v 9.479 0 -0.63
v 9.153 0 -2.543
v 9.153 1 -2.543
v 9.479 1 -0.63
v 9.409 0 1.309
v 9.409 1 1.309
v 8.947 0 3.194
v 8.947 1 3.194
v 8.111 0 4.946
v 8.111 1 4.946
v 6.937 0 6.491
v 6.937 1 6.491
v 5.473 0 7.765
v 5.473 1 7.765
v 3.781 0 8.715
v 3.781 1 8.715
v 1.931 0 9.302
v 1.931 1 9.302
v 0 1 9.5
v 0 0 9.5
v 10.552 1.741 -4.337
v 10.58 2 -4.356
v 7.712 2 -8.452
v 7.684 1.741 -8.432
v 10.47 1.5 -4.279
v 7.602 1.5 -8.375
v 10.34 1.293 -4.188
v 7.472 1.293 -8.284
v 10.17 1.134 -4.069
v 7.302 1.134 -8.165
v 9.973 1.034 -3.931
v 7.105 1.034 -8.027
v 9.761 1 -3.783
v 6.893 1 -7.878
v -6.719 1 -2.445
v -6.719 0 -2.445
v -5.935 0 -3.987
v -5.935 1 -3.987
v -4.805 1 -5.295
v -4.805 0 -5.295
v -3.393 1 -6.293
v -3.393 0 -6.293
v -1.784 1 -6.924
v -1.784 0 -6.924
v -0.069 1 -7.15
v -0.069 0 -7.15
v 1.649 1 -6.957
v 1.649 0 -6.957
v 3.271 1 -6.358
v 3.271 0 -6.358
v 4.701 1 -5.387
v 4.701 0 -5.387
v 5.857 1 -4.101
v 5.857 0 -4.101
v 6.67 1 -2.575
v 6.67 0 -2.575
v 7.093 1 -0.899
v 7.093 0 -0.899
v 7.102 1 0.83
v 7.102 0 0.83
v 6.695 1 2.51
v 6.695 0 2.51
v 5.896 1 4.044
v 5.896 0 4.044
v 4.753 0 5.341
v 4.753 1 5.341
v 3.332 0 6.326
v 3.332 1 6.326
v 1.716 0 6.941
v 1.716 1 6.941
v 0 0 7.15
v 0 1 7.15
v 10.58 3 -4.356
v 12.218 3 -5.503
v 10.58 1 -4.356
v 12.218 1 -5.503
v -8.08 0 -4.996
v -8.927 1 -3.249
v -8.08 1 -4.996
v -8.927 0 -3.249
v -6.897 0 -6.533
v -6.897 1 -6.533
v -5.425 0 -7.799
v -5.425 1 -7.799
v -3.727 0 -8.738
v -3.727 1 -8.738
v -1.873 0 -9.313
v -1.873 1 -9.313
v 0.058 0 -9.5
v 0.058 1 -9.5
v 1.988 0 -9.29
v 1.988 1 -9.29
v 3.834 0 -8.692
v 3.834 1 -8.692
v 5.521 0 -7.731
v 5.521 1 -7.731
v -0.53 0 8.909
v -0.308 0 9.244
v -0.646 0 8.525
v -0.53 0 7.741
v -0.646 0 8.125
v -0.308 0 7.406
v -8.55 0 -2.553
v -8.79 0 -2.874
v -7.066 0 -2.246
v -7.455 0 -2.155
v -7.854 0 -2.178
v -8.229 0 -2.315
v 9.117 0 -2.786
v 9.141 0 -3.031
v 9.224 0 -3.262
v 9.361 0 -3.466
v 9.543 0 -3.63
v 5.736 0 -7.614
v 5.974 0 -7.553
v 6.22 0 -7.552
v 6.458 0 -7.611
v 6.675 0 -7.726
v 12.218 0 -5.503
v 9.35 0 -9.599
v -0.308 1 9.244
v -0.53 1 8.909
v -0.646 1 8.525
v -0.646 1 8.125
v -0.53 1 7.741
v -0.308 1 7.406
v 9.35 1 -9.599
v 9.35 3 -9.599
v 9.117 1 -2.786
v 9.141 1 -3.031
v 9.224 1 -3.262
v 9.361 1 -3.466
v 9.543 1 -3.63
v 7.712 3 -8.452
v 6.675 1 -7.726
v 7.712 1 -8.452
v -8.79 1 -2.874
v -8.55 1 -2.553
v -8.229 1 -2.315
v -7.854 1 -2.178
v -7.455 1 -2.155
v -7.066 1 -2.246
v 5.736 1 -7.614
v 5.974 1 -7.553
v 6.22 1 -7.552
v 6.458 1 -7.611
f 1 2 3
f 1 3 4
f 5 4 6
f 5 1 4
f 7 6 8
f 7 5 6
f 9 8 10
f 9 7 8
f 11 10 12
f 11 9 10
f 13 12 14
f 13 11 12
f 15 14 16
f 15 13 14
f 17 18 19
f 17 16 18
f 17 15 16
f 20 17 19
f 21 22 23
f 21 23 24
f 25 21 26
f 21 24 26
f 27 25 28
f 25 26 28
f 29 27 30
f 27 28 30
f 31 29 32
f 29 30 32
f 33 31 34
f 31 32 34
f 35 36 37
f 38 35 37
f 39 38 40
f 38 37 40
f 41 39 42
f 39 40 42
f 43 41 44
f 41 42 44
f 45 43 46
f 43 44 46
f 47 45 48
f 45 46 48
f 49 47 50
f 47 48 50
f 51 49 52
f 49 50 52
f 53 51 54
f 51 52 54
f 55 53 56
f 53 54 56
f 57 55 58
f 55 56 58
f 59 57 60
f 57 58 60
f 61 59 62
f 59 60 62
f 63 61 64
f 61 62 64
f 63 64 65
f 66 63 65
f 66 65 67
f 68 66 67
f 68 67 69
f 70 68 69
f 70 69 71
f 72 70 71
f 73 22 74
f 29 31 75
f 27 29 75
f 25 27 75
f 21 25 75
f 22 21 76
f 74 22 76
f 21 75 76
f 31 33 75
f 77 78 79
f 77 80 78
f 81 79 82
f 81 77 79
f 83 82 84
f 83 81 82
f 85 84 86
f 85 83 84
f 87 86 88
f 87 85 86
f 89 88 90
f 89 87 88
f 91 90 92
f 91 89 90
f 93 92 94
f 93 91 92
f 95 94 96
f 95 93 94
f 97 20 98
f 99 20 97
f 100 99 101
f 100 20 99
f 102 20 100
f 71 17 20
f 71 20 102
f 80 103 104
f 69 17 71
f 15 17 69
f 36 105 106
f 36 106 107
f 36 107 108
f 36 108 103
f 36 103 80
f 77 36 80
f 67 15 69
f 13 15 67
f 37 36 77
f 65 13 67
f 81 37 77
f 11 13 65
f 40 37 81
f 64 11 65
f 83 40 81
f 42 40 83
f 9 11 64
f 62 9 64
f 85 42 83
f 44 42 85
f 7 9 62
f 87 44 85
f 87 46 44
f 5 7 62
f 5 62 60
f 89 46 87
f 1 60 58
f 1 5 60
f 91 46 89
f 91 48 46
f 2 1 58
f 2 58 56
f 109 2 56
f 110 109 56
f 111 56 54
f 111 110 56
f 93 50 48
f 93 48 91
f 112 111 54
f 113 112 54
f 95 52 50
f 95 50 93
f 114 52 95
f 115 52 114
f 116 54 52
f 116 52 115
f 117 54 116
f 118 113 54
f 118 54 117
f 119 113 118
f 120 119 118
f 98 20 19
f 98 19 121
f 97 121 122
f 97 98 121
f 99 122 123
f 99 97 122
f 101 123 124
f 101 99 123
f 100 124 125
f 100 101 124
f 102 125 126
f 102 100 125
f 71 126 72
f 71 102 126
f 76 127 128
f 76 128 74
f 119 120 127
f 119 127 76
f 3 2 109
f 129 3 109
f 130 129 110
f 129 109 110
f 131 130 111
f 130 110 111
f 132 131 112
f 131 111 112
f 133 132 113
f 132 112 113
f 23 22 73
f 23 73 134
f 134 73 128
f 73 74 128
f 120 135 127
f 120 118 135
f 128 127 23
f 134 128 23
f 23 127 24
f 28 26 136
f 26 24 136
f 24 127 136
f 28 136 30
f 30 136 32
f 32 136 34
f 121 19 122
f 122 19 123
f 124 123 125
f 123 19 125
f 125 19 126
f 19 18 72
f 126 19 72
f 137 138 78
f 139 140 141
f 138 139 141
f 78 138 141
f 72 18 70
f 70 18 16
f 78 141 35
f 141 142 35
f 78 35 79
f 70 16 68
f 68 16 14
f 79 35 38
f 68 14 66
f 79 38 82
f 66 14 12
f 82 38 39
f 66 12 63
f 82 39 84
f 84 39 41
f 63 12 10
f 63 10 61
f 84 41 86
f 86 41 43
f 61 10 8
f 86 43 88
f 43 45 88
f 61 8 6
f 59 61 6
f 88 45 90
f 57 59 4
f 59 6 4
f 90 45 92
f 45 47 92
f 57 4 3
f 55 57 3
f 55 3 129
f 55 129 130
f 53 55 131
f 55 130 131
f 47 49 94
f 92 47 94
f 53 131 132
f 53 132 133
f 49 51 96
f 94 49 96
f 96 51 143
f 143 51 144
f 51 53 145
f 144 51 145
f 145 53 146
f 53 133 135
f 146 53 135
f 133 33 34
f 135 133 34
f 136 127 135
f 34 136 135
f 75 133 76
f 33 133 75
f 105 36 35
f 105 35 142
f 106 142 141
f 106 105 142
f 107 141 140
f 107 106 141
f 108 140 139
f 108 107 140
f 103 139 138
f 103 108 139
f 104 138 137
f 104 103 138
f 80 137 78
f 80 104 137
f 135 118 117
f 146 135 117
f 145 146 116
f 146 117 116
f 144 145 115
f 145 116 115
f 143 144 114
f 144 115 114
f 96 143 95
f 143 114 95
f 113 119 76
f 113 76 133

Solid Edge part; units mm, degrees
sketch "Sketch1" plane through (0, 0, 0) normal (0, -1, 0) x (1, 0, 0)
  arc A0 (-6.7188, -2.4454) -> (-8.9271, -3.2492) centre (-7.5737, -3.5322) ccw
  arc A1 (0, 9.5) -> (0, 7.15) centre (0.7155, 8.325) ccw
  arc A2 (0, 9.5) -> (-8.9271, -3.2492) centre (0, 0) cw
  arc A3 (0, 7.15) -> (-6.7188, -2.4454) centre (0, 0) cw
extrude "Protrusion1" add sketch "Sketch1" against normal blind 1
sketch "Sketch2" plane through (0, 0, 0) normal (0, -1, 0) x (1, 0, 0)
  line L0 (12.2182, -5.5033) -> (8.9416, -3.209)
  line L1 (8.9416, -3.209) -> (6.0737, -7.3048)
  line L2 (6.0737, -7.3048) -> (9.3503, -9.5991)
  line L3 (9.3503, -9.5991) -> (12.2182, -5.5033)
extrude "Henkel_1" add sketch "Sketch2" against normal blind 1
sketch "Sketch3" plane through (0, 0, 0) normal (0, -1, 0) x (1, 0, 0)
  line L0 (10.5799, -4.3562) -> (7.712, -8.4519)
  line L1 (9.3503, -9.5991) -> (7.712, -8.4519)
  line L2 (12.2182, -5.5033) -> (9.3503, -9.5991)
  line L3 (10.5799, -4.3562) -> (12.2182, -5.5033)
extrude "Henkel_2" add sketch "Sketch3" against normal blind 3
fillet "Verrundung_1" radius 1 3 edges at (8.9416, 0.5, -3.209) (6.0737, 0.5, -7.3048) (9.146, 1, -6.4041)
